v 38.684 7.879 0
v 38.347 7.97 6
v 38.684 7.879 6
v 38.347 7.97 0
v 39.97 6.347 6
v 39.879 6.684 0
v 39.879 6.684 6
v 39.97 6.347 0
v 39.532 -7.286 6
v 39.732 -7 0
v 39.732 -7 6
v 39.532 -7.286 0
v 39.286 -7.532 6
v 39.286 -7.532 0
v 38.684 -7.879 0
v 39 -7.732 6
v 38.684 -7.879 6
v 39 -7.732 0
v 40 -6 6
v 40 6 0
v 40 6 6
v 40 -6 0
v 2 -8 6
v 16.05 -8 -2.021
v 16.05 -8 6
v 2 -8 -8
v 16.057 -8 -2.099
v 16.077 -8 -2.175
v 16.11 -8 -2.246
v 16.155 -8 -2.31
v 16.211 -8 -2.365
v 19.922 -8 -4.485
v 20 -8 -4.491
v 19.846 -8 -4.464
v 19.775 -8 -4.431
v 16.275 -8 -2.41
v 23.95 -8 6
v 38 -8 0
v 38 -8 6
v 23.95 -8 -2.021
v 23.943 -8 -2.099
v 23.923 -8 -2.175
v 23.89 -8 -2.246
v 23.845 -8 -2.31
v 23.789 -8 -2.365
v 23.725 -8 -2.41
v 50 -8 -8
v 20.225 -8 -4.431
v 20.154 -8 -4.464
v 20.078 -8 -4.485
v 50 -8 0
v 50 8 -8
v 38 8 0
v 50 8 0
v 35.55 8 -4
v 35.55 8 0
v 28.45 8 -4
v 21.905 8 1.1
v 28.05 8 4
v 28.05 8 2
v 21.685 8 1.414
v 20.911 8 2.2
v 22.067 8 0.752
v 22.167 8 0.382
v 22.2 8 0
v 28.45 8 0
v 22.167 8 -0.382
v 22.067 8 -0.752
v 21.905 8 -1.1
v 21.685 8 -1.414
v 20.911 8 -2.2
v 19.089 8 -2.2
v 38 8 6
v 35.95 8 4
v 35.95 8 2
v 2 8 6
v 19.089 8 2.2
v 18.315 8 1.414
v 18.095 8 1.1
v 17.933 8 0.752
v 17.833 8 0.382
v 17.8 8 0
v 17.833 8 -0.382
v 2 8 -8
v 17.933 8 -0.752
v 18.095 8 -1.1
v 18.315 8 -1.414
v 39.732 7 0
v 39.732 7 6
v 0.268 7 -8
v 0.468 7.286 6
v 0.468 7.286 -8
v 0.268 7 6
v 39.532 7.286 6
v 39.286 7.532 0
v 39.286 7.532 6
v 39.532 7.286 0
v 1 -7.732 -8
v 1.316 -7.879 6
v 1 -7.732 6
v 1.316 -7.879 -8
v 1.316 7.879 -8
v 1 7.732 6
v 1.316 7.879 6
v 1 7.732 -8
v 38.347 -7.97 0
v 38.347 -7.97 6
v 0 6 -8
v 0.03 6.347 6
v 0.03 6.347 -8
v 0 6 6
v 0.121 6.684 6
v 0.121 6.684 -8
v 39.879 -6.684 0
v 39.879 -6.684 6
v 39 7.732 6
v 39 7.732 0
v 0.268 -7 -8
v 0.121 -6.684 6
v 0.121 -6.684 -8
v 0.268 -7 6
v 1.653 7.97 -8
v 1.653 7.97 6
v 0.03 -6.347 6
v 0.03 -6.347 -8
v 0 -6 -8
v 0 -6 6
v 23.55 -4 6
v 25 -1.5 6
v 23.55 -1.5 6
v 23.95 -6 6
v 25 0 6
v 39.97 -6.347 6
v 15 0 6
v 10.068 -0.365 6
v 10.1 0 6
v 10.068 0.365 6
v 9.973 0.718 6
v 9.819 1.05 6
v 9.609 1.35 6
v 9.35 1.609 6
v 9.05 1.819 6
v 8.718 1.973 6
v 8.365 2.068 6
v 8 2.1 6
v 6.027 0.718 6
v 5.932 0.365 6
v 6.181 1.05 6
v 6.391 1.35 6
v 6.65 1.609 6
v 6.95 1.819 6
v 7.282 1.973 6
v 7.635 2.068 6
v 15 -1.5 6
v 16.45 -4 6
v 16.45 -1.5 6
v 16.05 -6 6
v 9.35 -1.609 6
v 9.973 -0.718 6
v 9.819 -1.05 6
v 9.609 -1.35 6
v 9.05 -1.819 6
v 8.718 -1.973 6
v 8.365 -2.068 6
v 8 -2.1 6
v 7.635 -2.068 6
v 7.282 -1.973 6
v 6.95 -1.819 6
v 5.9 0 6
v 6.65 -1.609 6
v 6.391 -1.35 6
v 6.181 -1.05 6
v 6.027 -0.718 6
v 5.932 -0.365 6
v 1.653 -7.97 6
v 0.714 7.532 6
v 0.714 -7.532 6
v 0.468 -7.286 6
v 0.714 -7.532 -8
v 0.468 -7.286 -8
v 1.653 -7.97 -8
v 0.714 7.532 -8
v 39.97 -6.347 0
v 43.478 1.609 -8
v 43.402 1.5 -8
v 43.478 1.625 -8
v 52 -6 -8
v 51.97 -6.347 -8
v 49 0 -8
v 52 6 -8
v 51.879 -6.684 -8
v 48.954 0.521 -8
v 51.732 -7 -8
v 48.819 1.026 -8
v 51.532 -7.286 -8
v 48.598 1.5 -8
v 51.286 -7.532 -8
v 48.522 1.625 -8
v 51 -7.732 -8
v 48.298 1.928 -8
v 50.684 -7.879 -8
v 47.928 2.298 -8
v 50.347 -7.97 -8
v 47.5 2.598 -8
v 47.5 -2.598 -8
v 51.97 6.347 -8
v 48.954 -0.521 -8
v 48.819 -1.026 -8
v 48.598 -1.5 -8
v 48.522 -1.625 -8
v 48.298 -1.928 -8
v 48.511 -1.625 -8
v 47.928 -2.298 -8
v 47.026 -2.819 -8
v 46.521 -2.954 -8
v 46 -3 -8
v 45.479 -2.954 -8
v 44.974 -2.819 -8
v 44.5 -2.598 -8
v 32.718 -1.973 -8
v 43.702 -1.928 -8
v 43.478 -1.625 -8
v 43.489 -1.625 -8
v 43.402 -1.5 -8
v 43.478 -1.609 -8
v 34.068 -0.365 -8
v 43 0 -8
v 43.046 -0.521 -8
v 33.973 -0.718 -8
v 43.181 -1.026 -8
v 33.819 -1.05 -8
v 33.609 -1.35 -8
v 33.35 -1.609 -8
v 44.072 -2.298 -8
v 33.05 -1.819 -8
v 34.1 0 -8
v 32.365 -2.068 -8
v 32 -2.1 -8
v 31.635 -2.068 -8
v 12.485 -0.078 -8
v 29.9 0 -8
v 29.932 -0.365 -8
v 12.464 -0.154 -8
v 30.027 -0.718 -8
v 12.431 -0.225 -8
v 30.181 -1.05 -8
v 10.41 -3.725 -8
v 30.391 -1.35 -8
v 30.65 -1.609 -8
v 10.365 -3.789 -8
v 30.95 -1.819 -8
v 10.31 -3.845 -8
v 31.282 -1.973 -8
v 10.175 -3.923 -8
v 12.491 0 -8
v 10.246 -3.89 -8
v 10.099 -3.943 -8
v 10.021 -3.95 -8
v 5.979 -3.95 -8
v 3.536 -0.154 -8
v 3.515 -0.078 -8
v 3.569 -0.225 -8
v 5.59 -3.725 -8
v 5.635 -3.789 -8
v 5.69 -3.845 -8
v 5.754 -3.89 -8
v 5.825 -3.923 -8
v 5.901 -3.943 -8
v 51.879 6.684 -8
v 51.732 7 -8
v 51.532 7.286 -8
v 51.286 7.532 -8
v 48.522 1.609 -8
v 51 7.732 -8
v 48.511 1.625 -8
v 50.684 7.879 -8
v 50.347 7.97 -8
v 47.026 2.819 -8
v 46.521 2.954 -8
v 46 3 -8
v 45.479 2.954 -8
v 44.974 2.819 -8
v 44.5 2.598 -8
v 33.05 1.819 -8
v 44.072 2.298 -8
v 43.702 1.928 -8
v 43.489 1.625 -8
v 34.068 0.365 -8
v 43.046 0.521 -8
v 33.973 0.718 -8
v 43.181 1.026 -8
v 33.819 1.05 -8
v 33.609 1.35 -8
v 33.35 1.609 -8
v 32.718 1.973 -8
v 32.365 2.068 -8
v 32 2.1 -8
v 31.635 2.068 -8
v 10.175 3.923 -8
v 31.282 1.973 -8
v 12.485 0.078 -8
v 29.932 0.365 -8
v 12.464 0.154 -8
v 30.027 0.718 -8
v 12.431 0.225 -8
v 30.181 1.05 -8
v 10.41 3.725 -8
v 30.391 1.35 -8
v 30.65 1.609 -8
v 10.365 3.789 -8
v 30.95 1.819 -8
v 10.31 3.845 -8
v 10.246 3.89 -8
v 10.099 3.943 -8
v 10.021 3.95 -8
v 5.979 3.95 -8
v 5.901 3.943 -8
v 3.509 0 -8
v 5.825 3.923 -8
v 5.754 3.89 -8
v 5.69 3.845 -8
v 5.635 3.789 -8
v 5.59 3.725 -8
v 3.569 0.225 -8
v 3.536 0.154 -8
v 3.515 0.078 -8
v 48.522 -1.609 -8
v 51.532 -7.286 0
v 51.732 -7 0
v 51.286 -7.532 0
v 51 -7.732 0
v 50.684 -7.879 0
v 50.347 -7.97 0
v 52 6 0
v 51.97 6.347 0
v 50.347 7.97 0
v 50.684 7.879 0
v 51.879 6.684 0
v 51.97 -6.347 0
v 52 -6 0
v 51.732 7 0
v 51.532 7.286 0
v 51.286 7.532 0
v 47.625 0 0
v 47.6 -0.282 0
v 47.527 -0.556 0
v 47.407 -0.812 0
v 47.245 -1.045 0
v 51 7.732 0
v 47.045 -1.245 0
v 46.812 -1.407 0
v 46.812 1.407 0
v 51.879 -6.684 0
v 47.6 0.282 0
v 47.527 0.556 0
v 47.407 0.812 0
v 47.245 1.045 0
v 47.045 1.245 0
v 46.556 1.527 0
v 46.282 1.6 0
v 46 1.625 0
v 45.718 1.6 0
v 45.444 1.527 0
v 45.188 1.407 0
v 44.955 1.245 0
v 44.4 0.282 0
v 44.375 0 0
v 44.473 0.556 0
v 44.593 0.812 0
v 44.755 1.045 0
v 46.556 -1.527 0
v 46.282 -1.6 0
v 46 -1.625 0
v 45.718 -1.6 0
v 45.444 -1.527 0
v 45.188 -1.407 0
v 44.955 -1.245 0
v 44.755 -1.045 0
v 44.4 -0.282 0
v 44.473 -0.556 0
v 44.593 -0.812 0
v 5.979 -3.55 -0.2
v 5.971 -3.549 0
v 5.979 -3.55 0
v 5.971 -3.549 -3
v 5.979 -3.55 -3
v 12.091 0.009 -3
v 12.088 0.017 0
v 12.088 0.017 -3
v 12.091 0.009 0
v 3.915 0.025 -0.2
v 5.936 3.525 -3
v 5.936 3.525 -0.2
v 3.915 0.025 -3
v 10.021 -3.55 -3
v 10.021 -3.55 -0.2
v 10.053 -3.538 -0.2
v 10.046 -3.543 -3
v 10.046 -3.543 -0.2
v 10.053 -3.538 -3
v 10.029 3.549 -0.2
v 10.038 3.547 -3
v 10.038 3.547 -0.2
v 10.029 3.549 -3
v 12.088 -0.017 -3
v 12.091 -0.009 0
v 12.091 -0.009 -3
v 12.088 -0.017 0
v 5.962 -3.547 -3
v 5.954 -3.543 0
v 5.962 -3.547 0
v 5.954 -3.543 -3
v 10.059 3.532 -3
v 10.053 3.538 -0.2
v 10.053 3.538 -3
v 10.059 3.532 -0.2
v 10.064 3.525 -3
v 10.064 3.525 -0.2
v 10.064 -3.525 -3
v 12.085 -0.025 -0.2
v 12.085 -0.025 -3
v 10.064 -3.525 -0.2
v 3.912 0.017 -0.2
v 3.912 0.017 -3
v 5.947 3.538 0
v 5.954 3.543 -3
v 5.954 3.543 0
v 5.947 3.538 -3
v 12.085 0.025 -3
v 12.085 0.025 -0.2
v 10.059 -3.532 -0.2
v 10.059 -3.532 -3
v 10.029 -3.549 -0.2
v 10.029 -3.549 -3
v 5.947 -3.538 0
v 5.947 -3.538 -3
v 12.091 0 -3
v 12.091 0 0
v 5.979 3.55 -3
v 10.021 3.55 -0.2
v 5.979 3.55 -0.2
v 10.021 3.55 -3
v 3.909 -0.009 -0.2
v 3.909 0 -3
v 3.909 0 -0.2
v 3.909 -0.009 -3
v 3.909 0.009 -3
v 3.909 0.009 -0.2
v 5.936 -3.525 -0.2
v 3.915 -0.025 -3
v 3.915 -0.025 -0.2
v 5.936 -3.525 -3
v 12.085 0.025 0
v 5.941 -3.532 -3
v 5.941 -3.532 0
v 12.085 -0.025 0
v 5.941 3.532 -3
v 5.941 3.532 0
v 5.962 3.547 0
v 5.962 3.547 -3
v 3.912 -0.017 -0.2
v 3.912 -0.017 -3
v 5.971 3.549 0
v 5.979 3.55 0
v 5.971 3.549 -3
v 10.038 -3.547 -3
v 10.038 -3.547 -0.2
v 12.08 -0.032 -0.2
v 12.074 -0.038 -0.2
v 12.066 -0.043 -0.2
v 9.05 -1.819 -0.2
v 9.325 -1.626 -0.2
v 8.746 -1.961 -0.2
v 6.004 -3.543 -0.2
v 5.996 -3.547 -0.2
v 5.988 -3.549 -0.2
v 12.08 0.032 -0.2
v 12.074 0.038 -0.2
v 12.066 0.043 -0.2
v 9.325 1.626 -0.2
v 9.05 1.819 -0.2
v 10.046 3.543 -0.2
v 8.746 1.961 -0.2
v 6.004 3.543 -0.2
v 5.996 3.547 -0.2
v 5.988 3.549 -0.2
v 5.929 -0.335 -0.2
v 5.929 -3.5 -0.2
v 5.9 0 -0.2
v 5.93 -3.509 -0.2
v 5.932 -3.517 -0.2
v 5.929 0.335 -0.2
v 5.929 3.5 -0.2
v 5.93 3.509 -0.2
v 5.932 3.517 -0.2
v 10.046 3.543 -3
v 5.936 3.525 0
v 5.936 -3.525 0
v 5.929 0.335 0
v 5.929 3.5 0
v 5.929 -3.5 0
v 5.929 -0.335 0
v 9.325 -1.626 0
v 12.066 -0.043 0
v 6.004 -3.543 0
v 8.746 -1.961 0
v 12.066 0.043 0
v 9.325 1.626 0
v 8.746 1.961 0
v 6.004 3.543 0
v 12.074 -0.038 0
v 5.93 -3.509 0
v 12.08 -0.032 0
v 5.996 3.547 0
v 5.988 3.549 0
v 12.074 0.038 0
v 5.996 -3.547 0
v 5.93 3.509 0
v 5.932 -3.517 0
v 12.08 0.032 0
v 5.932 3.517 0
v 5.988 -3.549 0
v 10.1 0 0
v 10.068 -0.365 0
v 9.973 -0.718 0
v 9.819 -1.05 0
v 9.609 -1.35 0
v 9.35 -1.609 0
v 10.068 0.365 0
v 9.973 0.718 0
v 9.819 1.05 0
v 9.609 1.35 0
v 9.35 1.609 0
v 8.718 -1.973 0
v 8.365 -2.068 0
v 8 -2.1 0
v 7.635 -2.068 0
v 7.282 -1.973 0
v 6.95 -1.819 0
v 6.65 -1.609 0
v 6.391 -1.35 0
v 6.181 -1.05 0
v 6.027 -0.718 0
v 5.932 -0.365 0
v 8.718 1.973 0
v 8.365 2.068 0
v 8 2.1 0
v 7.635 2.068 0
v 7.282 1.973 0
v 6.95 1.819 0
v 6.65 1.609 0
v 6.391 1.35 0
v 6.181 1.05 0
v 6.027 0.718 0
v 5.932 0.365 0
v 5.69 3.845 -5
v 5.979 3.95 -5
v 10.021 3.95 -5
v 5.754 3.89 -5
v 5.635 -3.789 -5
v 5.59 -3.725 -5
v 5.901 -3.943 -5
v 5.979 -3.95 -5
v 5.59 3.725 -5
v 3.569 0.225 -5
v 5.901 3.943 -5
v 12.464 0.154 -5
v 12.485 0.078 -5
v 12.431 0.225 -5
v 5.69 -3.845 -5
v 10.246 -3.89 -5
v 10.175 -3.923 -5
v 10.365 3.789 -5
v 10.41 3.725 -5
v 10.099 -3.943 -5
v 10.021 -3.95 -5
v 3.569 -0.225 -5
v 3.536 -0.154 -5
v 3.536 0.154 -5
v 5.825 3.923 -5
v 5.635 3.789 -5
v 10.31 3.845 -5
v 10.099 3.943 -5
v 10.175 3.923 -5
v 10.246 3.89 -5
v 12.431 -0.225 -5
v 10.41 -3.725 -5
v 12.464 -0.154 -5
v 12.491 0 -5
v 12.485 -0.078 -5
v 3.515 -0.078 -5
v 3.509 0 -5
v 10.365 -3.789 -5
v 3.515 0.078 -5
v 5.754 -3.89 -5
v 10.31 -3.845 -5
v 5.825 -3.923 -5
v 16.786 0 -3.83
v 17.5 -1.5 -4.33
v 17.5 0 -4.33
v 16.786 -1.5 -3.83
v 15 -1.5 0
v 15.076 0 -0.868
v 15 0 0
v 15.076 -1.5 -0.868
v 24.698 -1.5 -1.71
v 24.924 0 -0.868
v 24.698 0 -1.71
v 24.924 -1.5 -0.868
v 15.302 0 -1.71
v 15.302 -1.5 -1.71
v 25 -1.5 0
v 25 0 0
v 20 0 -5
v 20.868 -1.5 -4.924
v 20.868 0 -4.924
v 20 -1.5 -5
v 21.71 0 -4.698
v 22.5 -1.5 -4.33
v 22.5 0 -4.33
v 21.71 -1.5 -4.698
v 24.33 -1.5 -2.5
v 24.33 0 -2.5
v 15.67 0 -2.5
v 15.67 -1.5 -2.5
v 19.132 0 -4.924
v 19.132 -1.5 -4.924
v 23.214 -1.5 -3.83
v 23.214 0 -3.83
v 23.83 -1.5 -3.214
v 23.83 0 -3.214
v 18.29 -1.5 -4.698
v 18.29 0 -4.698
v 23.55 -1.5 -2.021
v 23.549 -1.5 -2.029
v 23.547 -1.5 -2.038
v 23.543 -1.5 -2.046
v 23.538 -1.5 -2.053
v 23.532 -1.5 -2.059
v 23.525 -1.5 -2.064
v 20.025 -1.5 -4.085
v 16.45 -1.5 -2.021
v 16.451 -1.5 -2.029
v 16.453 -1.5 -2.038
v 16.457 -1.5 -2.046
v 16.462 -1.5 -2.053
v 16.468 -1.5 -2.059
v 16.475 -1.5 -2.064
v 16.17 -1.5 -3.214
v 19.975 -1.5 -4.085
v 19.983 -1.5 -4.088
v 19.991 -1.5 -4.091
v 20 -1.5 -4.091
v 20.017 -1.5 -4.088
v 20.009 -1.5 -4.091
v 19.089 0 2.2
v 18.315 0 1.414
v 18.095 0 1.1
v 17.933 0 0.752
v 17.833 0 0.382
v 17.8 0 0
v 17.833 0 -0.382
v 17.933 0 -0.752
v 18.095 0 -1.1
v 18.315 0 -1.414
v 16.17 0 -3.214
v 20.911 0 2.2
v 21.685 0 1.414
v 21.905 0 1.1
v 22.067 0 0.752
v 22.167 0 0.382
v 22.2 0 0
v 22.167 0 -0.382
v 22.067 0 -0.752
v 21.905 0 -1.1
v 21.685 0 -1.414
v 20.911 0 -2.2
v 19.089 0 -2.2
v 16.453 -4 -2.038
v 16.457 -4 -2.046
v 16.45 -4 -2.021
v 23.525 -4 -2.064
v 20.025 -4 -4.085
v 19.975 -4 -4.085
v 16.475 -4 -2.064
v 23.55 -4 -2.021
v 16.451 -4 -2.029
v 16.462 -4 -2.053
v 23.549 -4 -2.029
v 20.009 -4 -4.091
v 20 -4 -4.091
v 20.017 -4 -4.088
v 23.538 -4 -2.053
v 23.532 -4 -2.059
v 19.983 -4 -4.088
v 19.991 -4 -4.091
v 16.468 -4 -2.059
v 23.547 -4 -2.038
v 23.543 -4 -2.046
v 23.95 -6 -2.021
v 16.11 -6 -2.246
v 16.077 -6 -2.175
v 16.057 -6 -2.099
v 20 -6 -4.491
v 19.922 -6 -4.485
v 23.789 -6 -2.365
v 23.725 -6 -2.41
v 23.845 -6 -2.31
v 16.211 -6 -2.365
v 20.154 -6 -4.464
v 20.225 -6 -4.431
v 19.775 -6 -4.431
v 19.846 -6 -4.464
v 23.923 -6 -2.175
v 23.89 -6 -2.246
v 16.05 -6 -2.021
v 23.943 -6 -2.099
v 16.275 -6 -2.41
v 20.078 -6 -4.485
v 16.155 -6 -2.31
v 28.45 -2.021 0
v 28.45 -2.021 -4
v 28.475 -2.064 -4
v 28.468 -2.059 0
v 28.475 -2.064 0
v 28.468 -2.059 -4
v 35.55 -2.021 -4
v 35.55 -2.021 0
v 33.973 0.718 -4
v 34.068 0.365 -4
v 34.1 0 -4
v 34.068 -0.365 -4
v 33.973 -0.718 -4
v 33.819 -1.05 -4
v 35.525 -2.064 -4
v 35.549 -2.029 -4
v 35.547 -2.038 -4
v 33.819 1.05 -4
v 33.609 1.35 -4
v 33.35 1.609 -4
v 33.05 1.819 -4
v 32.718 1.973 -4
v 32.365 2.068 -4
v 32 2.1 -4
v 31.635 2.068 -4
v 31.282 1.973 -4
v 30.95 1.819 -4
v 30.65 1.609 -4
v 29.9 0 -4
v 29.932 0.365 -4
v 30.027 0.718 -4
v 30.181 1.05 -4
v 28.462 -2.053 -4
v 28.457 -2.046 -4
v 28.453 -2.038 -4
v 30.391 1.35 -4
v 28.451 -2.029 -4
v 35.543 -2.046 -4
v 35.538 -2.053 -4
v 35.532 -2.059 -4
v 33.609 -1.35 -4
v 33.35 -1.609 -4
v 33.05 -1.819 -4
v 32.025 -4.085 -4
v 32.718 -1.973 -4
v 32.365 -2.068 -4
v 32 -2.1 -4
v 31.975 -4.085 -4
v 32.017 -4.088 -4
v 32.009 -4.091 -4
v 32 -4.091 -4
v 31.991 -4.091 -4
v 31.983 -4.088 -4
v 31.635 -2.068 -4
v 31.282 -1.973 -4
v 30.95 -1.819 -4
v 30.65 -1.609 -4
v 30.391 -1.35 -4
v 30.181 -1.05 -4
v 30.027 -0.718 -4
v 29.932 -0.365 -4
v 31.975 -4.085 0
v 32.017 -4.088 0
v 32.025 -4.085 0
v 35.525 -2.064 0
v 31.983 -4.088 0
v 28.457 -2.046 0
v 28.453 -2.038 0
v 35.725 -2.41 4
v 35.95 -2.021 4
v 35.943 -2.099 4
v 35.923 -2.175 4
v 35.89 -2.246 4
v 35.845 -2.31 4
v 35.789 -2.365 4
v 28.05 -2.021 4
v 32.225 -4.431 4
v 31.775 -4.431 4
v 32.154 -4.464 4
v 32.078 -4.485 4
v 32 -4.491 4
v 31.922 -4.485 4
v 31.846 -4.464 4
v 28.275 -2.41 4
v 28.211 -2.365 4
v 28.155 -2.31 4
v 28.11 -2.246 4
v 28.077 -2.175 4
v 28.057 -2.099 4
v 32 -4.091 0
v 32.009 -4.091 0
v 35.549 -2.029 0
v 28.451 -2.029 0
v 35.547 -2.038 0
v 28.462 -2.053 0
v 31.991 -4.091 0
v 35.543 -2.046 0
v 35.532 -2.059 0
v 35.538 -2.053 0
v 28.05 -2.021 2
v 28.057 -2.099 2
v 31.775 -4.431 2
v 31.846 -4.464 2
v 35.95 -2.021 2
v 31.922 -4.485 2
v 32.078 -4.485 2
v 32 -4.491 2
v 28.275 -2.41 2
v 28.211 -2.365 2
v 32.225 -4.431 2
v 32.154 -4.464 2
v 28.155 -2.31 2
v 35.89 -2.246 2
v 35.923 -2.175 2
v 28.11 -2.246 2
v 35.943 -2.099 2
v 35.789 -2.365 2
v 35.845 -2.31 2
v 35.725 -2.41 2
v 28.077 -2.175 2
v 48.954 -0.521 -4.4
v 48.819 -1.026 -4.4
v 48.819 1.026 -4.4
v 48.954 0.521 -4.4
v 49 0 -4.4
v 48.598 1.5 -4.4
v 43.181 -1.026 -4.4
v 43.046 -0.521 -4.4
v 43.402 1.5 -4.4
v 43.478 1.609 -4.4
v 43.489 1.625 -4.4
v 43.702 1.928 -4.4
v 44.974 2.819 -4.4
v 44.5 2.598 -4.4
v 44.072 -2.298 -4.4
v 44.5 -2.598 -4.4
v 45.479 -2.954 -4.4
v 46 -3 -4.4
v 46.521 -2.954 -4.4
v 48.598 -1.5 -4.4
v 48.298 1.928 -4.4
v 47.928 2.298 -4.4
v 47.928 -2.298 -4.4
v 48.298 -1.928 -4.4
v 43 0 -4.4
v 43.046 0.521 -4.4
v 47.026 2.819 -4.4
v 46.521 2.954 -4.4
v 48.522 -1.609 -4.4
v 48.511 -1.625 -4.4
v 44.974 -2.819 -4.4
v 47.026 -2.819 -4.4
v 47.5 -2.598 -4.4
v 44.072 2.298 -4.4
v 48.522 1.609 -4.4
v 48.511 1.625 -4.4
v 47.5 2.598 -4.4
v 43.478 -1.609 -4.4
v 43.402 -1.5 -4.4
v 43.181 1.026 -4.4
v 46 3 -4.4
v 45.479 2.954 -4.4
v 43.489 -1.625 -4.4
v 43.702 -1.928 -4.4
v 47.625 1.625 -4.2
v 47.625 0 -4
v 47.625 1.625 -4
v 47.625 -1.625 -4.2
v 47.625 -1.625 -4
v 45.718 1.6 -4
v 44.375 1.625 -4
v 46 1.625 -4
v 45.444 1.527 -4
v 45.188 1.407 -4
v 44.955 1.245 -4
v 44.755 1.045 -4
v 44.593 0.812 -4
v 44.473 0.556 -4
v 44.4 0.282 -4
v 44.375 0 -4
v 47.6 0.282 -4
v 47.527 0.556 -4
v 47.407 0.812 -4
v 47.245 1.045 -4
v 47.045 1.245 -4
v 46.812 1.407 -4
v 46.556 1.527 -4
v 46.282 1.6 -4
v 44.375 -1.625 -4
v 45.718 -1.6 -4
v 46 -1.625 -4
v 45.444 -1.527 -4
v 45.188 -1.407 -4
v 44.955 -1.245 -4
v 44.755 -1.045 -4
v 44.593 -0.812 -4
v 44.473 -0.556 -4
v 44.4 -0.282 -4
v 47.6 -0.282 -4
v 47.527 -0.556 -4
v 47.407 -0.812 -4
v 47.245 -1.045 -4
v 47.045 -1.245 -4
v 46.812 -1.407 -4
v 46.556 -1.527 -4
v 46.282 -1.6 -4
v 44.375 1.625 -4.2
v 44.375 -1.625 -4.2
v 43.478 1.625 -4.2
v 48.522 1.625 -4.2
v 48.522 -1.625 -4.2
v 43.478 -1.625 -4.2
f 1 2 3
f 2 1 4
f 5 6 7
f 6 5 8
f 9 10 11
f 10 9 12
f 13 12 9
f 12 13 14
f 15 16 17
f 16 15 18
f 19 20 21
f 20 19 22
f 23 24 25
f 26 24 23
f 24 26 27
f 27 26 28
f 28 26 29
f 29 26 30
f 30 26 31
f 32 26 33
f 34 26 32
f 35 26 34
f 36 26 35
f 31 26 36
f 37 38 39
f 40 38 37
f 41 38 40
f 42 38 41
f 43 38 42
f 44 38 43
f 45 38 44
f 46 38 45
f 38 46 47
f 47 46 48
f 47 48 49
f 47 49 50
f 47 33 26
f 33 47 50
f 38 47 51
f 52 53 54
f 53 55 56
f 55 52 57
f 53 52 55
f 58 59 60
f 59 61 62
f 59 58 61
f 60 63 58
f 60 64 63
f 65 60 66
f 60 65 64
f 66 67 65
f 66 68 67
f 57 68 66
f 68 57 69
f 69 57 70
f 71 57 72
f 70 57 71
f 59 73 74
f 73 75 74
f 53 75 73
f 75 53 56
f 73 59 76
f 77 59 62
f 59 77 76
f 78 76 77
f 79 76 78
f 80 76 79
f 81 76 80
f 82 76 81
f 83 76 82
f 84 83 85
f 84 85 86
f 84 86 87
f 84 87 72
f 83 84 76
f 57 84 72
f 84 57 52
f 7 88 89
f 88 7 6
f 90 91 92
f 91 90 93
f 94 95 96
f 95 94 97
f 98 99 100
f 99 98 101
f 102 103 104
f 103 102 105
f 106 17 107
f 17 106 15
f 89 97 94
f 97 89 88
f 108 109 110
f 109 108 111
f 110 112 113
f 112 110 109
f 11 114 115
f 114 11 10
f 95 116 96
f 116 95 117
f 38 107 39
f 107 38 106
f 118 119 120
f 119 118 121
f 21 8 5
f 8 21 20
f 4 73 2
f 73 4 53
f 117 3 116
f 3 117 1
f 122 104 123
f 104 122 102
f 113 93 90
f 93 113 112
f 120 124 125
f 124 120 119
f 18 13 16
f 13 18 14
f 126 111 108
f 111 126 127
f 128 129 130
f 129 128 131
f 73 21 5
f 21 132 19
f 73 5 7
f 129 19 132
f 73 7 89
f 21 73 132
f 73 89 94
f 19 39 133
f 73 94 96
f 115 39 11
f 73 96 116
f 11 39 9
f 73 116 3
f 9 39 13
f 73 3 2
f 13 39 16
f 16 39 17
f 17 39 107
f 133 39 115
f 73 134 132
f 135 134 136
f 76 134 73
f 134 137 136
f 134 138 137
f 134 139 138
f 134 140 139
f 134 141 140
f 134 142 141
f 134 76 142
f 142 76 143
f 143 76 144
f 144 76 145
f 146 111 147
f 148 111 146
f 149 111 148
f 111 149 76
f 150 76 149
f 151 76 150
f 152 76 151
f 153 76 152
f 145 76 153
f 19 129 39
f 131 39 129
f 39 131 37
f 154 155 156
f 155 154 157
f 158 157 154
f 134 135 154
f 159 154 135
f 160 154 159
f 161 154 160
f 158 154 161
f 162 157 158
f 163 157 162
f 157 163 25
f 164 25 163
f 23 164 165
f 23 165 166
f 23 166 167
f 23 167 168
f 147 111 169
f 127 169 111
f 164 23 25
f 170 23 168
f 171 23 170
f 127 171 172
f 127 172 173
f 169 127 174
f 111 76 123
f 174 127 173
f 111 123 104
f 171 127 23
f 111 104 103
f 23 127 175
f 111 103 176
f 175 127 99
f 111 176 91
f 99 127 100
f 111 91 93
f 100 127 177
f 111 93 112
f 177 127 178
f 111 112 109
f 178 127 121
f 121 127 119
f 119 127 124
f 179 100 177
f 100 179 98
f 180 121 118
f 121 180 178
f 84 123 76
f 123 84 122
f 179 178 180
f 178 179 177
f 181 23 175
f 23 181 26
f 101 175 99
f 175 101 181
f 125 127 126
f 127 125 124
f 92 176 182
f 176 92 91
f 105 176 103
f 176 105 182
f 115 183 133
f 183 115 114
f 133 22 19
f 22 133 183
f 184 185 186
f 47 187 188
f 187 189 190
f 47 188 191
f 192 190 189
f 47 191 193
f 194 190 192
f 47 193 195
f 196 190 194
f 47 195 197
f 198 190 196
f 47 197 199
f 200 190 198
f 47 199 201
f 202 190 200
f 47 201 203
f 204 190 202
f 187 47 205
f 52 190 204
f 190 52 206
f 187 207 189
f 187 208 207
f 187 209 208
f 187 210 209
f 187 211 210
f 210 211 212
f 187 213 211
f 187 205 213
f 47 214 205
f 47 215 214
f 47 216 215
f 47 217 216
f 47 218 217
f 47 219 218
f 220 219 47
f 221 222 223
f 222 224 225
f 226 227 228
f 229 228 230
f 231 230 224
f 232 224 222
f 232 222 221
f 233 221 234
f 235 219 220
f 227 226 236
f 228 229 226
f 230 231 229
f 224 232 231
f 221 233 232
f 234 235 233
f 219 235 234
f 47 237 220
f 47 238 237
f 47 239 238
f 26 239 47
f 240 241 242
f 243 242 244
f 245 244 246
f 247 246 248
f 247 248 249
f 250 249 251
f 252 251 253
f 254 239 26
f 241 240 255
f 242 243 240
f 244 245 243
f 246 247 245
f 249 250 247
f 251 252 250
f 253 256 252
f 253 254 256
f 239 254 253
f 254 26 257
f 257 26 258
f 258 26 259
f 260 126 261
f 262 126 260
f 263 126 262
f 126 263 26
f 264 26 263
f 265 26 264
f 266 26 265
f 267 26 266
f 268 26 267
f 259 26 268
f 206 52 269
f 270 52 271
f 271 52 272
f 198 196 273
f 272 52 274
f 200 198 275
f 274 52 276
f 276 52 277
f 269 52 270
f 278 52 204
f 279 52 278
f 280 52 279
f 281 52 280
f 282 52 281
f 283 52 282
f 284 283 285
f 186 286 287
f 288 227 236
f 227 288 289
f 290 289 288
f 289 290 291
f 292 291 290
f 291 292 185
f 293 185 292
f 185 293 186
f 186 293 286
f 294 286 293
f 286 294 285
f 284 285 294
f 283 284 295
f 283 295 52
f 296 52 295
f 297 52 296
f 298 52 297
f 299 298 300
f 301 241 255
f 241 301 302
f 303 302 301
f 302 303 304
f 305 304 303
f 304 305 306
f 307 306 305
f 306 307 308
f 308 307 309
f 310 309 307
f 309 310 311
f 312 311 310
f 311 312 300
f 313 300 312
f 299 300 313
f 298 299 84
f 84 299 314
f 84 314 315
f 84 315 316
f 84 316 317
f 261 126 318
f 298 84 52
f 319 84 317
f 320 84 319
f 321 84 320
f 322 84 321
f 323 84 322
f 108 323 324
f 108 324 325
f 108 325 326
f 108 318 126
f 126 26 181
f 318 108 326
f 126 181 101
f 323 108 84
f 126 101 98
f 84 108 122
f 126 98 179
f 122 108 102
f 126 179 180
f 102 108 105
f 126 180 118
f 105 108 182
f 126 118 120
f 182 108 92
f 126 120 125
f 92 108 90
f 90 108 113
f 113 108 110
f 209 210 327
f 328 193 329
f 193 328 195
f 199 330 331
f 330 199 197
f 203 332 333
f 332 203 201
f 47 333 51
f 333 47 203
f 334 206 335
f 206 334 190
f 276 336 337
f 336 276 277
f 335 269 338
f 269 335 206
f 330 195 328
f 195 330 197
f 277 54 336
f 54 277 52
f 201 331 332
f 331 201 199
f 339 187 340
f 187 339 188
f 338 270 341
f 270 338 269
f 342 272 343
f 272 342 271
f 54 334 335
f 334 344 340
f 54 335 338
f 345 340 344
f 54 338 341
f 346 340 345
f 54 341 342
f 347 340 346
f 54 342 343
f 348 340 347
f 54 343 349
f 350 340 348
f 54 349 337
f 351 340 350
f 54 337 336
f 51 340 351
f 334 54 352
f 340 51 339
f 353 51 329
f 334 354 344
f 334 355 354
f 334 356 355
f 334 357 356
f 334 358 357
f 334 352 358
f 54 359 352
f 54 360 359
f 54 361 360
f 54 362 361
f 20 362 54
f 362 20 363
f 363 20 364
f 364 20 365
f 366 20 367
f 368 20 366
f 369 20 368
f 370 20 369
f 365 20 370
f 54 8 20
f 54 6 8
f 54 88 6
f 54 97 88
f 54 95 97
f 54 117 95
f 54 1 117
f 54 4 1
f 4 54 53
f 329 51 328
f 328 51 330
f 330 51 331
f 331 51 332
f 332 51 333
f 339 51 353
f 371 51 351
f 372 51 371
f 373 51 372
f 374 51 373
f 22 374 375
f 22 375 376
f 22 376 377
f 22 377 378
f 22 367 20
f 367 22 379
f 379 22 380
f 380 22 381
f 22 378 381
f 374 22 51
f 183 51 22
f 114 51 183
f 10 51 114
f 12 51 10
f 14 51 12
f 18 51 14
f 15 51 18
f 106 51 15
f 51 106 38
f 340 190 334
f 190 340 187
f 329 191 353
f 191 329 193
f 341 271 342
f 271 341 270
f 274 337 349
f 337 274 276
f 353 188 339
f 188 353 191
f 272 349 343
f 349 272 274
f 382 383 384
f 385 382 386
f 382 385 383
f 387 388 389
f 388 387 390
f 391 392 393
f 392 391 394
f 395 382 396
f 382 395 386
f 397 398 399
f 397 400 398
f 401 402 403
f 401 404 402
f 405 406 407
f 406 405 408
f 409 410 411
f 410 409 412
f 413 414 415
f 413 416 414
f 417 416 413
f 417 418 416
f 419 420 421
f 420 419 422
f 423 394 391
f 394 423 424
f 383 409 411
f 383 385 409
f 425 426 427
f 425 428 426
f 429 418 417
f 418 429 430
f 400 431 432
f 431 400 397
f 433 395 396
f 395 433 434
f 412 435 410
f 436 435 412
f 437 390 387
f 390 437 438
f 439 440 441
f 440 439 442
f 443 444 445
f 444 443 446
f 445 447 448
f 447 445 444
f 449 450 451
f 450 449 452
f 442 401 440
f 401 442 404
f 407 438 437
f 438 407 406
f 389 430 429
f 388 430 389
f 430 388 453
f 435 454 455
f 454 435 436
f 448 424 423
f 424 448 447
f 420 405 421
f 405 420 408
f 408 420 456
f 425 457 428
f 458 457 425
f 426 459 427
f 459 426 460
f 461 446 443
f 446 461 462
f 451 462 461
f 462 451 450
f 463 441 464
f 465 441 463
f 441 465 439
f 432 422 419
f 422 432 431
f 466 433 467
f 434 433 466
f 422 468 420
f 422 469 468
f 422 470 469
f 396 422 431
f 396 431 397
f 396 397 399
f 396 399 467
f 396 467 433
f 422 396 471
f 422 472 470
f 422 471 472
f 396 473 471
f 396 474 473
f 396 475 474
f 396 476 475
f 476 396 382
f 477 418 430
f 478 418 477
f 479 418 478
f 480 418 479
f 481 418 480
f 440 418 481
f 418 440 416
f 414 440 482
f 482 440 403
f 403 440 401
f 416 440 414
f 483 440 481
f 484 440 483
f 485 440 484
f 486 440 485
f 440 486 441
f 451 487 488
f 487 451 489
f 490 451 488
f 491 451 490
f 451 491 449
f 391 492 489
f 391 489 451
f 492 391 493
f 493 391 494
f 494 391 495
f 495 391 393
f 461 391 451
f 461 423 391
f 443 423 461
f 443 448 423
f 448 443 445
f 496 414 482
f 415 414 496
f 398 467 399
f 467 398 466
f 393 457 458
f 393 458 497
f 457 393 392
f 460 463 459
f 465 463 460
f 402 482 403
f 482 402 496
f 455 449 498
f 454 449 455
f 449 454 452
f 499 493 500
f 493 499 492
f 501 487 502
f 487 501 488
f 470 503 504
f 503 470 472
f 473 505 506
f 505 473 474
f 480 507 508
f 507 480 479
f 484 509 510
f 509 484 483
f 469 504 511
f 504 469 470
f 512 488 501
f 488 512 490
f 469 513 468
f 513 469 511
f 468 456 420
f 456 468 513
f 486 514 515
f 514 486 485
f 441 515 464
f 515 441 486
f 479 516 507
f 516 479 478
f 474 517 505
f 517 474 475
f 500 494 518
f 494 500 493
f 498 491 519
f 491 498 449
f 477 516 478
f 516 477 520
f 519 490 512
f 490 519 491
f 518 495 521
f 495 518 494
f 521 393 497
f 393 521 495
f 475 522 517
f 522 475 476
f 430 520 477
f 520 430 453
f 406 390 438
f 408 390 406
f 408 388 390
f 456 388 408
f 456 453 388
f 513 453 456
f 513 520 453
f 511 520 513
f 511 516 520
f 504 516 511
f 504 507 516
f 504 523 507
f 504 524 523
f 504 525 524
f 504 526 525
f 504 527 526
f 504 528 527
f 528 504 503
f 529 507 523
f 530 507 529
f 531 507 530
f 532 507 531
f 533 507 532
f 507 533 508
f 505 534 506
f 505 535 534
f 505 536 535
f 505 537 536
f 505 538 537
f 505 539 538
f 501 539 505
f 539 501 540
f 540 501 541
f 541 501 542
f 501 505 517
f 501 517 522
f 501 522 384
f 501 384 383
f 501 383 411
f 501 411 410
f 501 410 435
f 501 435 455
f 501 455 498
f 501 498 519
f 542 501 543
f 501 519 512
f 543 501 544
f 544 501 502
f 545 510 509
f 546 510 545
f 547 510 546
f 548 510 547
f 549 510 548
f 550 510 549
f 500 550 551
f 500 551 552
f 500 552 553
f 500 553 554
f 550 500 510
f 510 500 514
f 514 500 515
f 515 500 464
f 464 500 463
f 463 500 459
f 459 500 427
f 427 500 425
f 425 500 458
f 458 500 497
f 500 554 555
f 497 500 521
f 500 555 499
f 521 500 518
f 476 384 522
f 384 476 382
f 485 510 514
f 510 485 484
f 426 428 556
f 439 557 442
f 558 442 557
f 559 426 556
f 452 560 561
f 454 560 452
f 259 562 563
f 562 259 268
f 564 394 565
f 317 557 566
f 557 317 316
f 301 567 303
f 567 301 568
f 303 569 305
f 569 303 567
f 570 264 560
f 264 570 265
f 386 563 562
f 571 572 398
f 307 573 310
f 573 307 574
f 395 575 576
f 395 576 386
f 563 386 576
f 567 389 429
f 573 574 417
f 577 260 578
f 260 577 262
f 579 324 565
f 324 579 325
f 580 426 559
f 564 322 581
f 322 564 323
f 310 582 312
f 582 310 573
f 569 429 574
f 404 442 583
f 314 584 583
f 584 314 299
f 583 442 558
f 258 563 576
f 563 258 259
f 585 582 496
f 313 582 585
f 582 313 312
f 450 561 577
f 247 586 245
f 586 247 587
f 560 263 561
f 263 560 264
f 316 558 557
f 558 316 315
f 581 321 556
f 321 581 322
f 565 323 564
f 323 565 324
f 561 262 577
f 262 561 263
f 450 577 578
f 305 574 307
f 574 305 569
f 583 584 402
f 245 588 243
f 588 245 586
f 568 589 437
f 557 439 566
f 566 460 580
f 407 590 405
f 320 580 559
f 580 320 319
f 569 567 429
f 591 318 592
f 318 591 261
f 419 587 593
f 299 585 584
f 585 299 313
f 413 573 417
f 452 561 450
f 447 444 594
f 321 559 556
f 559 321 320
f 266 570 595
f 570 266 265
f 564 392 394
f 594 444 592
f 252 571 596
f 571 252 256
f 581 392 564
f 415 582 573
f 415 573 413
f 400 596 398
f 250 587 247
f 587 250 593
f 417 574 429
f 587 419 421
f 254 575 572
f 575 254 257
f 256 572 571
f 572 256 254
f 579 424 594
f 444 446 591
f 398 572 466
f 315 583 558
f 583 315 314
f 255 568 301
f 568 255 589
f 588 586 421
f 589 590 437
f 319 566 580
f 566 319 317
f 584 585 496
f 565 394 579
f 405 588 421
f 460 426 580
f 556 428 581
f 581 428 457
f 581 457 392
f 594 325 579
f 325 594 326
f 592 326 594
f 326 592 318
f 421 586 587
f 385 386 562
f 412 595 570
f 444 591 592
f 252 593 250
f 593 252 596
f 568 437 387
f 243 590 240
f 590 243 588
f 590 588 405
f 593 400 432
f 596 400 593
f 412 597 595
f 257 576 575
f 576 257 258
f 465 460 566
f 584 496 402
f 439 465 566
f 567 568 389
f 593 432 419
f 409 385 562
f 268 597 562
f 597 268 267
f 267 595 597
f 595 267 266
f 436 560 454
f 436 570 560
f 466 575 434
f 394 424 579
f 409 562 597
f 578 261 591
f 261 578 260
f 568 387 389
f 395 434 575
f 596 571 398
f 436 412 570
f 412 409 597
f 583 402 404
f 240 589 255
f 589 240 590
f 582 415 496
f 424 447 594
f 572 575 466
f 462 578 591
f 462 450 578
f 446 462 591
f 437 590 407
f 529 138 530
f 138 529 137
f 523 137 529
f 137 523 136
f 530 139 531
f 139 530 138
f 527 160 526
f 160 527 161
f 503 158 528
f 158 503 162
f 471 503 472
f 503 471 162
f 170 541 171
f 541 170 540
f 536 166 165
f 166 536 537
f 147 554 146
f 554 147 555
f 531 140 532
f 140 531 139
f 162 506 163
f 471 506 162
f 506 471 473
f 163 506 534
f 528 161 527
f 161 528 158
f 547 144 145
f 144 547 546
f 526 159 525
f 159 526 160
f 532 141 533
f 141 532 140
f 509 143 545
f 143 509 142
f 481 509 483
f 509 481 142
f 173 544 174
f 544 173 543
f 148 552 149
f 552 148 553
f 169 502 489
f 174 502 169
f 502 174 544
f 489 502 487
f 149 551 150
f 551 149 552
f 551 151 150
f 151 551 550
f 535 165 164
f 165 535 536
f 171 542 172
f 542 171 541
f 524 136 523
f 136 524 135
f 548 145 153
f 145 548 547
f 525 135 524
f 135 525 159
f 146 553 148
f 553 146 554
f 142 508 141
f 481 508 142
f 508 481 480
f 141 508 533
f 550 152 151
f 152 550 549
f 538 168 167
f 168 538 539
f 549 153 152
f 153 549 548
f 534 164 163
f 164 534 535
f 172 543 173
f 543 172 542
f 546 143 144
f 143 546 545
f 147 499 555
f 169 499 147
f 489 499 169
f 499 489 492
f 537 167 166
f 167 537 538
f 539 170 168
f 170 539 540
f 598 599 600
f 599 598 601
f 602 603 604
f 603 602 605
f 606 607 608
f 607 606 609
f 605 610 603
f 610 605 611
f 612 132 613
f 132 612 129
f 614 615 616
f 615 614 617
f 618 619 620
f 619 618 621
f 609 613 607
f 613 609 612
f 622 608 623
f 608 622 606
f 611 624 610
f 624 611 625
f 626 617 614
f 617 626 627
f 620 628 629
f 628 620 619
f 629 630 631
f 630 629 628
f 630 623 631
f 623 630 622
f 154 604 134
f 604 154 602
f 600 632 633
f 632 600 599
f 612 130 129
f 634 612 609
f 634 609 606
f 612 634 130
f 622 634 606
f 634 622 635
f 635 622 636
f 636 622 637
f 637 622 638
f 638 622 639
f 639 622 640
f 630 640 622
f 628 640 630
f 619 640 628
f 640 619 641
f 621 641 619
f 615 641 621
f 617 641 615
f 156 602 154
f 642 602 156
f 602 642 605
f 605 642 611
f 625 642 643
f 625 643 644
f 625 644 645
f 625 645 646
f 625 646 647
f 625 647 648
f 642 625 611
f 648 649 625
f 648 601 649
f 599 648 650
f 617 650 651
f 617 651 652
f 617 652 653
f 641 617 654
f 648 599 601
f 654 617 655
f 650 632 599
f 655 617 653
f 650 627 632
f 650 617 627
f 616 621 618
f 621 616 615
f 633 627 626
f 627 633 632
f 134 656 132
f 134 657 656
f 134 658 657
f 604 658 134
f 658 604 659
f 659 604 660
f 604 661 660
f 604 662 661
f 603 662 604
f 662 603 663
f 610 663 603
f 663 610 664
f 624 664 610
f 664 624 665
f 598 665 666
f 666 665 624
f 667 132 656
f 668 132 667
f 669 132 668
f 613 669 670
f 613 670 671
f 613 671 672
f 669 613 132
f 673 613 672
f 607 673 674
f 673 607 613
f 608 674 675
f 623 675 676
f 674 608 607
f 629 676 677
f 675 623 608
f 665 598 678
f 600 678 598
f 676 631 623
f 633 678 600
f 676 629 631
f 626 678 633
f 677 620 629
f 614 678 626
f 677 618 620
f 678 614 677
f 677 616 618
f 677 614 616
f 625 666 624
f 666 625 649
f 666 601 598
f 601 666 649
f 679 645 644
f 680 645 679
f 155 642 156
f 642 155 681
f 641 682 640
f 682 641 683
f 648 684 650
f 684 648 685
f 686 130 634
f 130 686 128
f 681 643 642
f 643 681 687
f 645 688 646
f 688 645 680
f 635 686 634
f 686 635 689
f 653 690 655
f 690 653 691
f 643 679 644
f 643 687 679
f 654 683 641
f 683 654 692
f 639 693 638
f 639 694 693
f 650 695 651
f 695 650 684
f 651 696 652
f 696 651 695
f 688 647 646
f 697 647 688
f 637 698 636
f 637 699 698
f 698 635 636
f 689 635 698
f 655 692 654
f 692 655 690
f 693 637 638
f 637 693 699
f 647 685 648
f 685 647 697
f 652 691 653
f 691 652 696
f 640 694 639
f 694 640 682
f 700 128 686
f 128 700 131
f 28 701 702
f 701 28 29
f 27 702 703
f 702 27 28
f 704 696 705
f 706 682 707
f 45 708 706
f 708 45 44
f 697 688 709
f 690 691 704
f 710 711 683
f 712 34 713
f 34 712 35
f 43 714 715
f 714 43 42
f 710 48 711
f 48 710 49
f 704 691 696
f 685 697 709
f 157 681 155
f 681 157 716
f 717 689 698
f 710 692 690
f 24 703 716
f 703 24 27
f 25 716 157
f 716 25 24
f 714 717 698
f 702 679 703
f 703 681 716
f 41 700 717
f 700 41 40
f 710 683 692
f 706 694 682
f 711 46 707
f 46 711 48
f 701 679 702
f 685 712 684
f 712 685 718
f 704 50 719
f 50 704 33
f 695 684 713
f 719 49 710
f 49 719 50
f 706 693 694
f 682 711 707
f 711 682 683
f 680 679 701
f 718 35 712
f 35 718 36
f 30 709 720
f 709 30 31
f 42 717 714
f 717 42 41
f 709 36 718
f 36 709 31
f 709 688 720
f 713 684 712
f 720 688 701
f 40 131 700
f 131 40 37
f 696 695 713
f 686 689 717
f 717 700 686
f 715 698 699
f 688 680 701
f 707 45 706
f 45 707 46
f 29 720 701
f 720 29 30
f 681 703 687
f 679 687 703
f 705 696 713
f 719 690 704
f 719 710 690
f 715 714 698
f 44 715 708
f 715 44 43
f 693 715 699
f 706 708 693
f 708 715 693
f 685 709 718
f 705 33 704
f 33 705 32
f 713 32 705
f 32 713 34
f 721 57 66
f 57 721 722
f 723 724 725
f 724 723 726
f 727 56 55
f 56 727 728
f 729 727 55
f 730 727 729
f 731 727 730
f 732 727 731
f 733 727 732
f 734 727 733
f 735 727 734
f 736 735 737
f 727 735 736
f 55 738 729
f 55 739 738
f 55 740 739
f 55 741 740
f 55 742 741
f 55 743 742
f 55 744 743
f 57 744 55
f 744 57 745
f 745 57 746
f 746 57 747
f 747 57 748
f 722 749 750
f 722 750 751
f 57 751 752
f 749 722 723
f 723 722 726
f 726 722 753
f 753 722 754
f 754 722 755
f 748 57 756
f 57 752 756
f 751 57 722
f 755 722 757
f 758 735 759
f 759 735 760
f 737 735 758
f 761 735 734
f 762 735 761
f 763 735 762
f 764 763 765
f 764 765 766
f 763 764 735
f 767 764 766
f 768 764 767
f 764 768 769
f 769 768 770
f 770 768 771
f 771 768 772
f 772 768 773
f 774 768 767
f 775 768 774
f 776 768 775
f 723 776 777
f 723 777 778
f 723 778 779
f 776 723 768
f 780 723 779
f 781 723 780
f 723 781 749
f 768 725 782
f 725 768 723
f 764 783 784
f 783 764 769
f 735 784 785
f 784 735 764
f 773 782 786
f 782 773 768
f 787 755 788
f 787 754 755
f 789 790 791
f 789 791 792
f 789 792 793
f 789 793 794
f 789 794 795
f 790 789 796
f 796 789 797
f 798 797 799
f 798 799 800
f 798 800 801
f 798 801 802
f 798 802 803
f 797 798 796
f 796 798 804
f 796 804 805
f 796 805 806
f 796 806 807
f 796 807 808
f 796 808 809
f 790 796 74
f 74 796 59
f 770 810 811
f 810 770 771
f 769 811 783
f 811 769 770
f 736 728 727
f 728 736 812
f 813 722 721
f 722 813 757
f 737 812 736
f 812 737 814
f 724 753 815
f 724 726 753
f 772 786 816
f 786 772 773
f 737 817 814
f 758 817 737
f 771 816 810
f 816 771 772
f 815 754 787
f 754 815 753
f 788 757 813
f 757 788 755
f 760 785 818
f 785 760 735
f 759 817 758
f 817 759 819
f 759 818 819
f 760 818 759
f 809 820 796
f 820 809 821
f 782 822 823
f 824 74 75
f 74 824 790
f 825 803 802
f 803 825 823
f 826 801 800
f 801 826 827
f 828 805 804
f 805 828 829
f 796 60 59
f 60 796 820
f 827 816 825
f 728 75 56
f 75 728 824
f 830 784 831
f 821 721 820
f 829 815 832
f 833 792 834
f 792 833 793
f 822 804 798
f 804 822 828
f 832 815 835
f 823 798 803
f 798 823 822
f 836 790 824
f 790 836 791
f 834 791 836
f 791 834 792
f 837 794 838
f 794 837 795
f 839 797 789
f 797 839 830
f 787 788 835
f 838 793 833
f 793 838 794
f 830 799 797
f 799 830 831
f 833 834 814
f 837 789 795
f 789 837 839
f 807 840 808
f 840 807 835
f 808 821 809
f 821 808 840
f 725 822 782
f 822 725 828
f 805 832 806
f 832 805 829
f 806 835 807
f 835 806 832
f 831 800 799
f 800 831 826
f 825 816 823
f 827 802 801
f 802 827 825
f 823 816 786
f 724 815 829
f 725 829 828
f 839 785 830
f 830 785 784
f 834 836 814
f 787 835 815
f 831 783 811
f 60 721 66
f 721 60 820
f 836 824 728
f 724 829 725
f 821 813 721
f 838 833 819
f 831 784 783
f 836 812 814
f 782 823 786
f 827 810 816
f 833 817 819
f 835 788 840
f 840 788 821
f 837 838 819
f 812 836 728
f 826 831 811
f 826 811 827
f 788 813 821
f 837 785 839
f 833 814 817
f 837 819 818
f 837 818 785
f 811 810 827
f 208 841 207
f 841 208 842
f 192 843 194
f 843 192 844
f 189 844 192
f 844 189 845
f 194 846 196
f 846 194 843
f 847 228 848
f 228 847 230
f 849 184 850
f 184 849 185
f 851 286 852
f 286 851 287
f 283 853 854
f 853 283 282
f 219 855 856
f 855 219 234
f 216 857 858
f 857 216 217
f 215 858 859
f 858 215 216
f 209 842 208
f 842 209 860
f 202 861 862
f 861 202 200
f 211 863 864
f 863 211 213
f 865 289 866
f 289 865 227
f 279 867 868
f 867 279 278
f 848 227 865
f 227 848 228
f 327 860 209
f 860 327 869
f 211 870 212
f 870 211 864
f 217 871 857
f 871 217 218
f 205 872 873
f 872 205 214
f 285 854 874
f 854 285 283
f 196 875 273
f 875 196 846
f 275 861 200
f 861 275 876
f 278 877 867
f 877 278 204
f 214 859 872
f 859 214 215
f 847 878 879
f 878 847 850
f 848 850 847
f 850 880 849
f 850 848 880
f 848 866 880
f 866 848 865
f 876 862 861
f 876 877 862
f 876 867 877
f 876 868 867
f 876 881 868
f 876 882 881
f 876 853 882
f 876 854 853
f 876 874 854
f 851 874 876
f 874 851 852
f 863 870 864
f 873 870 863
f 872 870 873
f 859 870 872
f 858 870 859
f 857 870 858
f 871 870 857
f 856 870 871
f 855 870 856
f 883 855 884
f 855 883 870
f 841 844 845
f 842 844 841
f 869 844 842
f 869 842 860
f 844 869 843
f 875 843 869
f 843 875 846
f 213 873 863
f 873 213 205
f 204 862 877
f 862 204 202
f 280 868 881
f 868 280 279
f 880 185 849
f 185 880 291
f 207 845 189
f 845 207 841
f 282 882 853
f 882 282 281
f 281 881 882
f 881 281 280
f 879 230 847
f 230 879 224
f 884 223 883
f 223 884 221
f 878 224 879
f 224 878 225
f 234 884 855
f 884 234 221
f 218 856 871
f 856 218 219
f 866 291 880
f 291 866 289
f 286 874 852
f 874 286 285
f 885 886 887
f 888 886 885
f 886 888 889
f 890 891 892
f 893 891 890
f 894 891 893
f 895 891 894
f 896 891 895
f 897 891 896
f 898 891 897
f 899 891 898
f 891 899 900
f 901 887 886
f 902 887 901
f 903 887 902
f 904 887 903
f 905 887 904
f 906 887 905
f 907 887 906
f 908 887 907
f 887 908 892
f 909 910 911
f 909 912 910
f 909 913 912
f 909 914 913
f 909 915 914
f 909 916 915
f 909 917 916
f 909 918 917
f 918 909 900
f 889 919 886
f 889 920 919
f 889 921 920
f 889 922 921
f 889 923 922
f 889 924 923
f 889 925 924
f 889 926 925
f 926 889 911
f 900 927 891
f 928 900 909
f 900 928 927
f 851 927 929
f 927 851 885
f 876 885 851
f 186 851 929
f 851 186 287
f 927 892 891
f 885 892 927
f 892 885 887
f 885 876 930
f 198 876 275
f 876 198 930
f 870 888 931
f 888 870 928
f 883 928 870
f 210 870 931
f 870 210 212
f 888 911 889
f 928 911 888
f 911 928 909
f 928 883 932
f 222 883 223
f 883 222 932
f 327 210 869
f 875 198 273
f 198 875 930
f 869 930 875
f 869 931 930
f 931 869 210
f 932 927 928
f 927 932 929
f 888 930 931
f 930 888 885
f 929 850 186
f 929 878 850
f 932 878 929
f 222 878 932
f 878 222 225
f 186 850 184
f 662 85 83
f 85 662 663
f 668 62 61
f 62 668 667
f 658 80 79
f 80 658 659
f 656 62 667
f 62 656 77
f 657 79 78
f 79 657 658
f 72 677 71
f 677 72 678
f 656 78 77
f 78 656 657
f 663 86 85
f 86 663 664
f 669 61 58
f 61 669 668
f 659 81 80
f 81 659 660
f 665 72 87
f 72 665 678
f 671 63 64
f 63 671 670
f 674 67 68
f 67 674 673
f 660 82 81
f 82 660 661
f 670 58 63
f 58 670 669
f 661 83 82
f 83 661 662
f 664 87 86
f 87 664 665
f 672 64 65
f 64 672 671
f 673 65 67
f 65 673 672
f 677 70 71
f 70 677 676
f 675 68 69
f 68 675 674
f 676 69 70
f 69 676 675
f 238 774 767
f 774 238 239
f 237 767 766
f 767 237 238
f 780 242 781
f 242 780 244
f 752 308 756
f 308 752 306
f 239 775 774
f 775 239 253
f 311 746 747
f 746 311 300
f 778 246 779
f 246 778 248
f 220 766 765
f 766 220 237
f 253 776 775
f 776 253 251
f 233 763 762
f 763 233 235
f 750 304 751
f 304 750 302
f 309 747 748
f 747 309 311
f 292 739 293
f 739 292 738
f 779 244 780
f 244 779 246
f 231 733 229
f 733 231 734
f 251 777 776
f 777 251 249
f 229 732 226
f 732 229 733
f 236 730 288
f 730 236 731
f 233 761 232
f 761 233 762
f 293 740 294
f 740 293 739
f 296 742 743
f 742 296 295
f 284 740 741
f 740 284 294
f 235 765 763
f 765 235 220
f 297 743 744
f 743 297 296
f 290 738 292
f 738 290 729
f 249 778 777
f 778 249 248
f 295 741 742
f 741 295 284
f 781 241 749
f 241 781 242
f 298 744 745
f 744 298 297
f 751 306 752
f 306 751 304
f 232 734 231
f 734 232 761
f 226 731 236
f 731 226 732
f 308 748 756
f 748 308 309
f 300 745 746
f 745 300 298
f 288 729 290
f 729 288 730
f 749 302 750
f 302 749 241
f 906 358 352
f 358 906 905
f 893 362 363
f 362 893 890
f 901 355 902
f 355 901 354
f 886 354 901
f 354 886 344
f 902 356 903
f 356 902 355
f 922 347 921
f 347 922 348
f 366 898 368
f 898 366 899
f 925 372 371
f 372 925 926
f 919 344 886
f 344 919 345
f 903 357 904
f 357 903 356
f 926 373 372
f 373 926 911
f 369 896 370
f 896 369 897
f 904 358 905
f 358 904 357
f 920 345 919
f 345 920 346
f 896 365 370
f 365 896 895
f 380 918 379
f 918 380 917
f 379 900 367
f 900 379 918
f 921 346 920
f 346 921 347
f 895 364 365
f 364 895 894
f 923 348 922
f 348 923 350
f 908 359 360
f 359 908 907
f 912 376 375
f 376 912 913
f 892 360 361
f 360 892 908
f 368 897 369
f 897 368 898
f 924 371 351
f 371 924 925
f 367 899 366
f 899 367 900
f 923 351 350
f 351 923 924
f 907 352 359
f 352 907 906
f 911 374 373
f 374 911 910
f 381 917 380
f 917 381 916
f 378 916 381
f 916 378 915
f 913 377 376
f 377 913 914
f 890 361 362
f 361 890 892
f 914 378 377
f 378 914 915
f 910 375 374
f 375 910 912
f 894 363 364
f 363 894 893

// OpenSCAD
$fn=36;

include <ksp_controller_include.scad>;

difference() {
    union() {
        hull() {
            translate([2,(8-2),-8]) cylinder(r=2,h=14);
            translate([2,-(8-2),-8]) cylinder(r=2,h=14);
            
            translate([(8+24+8-2),(8-2),-8]) cylinder(r=2,h=14);
            translate([(8+24+8-2),-(8-2),-8]) cylinder(r=2,h=14);
        }
        hull() {
            translate([2,(8-2),-8]) cylinder(r=2,h=8);
            translate([2,-(8-2),-8]) cylinder(r=2,h=8);
            
            translate([(8+24+8+12-2),(8-2),-8]) cylinder(r=2,h=8);
            translate([(8+24+8+12-2),-(8-2),-8]) cylinder(r=2,h=8);
        }
    }
    translate([8,0,8]) {
        m4_co(25,false,0,8,false,true);
    }
    translate([8+12,0,0]) {
        m4_endnut_co();
    }
    
    translate([8+12,-25,0]) rotate([-90,0,0]) hull() {
        cylinder(r=m4_h_r,h=50);
        translate([-(m4_h_r)*tan(22.5),-(m4_h_r),0]) cube([2*(m4_h_r)*tan(22.5),2*(m4_h_r),50]);
    }
    
    
    translate([8+24,0,-8+4]) {
        m4_endnut_vert_co();
    }
    translate([8+24,0,-8-1]) hull() {
        cylinder(r=m4_v_r,h=8);
    }
    
    translate([8+24+8+6,0,-8-1]) cylinder(r=m3_v_r,h=50);
    translate([8+24+8+6,0,-50-4]) {
        cylinder(r=2.5+0.5,h=50-0.4);
        translate([-m3_v_r,-m3_v_r,0]) cube([2*m3_v_r,2*m3_v_r,50]);
        translate([-sqrt(pow(2.5+0.5,2)-pow(m3_v_r,2)),-m3_v_r,0]) cube([2*sqrt(pow(2.5+0.5,2)-pow(m3_v_r,2)),2*m3_v_r,50-0.2]);
    }
}
